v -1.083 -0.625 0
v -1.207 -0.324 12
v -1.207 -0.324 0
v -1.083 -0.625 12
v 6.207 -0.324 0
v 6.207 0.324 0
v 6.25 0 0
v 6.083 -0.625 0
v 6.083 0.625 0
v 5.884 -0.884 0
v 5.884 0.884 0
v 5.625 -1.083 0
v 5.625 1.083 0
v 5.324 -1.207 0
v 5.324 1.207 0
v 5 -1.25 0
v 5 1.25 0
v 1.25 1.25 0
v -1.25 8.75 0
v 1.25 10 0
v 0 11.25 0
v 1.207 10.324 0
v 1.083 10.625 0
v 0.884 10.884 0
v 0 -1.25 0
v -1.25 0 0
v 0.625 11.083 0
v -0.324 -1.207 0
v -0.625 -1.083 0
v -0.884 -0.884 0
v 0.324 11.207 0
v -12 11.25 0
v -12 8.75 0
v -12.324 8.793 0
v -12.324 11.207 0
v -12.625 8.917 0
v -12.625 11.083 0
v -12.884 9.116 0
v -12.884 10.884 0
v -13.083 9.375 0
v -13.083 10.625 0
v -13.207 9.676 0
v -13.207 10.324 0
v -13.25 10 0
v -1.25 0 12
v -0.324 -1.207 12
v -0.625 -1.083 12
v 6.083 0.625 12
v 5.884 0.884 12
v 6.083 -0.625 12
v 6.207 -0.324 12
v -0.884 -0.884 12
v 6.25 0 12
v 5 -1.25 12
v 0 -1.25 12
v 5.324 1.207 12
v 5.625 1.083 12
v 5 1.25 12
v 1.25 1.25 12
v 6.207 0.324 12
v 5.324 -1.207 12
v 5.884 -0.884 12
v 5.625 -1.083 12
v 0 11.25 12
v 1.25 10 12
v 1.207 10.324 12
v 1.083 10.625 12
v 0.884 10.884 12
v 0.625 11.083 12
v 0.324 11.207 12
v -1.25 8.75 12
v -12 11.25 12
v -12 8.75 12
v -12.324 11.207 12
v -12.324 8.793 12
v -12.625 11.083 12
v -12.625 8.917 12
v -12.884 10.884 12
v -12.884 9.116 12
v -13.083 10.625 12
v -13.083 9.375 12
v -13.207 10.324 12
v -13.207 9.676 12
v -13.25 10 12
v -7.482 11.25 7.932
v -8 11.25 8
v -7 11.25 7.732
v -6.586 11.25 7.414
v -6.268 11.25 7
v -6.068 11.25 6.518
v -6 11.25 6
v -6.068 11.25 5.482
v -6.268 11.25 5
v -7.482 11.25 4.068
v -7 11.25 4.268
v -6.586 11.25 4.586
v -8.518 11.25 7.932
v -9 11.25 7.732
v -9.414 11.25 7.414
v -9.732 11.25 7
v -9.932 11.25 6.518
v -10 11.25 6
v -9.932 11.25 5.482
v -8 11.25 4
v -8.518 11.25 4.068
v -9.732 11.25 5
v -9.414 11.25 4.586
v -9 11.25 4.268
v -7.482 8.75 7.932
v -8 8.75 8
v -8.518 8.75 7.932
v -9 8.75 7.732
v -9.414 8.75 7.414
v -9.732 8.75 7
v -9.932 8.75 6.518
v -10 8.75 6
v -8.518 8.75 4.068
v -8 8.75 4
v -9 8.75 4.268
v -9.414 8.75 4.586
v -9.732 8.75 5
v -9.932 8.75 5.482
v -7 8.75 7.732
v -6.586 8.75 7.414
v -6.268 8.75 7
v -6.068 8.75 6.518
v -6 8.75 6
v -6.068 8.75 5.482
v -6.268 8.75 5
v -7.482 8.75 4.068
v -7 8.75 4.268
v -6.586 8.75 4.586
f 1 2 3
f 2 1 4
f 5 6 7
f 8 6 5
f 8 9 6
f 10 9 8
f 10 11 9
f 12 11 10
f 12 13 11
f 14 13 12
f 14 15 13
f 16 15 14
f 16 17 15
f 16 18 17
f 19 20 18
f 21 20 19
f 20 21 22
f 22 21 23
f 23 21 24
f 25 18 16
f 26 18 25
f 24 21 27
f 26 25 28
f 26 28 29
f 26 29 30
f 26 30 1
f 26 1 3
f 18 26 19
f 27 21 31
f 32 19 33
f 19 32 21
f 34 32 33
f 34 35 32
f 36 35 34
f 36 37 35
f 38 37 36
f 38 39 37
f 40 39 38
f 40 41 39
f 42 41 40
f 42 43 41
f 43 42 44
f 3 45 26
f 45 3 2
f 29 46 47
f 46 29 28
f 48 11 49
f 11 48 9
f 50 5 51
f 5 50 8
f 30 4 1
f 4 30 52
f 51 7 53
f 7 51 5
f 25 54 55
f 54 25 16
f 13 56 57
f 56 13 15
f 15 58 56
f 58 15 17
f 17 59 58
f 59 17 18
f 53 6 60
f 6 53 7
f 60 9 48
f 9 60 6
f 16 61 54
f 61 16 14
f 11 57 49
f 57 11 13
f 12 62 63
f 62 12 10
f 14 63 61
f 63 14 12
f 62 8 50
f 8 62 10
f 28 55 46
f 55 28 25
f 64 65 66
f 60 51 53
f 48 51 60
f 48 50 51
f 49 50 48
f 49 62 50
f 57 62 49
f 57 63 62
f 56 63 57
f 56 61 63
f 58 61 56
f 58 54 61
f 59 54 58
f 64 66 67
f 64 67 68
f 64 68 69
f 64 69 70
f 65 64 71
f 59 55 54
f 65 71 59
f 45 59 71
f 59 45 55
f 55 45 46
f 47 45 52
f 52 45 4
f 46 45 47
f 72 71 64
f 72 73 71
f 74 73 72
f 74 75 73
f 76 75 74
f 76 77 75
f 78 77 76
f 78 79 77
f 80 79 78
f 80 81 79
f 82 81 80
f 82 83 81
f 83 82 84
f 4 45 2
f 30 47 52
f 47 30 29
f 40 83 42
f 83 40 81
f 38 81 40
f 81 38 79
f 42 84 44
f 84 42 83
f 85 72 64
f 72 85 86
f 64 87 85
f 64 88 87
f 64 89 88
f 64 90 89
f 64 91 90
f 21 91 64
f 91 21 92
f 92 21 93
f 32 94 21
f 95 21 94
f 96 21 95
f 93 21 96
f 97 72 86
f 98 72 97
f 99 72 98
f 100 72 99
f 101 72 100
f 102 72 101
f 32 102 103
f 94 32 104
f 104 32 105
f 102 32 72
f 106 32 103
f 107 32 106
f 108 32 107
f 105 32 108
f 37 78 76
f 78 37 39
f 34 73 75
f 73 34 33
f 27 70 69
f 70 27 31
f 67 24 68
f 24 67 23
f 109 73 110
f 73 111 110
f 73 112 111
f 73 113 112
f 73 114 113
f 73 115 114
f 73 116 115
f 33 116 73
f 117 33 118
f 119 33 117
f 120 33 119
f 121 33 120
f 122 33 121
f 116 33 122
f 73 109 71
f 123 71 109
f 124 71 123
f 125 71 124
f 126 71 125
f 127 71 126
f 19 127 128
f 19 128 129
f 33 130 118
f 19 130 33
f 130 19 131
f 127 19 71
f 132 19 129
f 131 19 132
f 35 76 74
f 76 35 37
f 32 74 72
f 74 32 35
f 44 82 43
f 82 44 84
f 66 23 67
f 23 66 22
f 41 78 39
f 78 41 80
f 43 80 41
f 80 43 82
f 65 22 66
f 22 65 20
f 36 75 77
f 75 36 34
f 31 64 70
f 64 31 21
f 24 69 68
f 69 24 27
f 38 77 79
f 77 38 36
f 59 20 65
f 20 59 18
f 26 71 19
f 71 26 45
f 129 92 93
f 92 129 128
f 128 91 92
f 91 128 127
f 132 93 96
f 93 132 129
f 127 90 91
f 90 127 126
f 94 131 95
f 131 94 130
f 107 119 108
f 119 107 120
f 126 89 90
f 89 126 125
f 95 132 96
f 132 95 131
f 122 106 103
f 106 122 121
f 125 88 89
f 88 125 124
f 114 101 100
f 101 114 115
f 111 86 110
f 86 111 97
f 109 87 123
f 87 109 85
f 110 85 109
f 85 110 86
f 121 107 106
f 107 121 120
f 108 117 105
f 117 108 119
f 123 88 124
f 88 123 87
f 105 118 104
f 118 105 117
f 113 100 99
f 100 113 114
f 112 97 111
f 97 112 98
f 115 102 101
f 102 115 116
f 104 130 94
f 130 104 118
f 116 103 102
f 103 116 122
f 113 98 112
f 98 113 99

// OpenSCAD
// file: tabletop_fastener
// author: clayb.rpi@gmail.com
// date: 2014-03-17
//
// A tabletop fastener for connecting a tabletop to a slotted rail.
//
// NOTE: The convex corners are rounded to discourage warping while printing.


// The diameter of the screw being used. This affects bracket width.
SCREW_DIAMETER = 4;

// How thick the piece should be. This will need to be less than your slot width.
THICKNESS = 2.5;

// How deep the slot is.
SLOT_DEPTH = 5;

// How offset the slot is from the table top.
SLOT_OFFSET = 10;


$fn=24;

difference() {
  union() {
    linear_extrude(height=SCREW_DIAMETER * 3) {
      hull() {
        circle(r=THICKNESS / 2);
        translate([SLOT_DEPTH, 0])
        circle(r=THICKNESS / 2);
      }
    }

    linear_extrude(height=SCREW_DIAMETER * 3) {
      translate([0, SLOT_OFFSET])
      hull() {
        circle(r=THICKNESS / 2);
        translate([-SCREW_DIAMETER * 3, 0])
        circle(r=THICKNESS / 2);
      }
    }

    translate([-THICKNESS / 2, 0, 0])
    cube([THICKNESS, SLOT_OFFSET, SCREW_DIAMETER * 3]);
  }

  // Cut out a hole for the screw.
  translate([-2 * SCREW_DIAMETER, SLOT_OFFSET - THICKNESS, SCREW_DIAMETER * 3 / 2])
  rotate([-90, 0, 0])
  cylinder(r=SCREW_DIAMETER / 2, h=2 * THICKNESS);
}
